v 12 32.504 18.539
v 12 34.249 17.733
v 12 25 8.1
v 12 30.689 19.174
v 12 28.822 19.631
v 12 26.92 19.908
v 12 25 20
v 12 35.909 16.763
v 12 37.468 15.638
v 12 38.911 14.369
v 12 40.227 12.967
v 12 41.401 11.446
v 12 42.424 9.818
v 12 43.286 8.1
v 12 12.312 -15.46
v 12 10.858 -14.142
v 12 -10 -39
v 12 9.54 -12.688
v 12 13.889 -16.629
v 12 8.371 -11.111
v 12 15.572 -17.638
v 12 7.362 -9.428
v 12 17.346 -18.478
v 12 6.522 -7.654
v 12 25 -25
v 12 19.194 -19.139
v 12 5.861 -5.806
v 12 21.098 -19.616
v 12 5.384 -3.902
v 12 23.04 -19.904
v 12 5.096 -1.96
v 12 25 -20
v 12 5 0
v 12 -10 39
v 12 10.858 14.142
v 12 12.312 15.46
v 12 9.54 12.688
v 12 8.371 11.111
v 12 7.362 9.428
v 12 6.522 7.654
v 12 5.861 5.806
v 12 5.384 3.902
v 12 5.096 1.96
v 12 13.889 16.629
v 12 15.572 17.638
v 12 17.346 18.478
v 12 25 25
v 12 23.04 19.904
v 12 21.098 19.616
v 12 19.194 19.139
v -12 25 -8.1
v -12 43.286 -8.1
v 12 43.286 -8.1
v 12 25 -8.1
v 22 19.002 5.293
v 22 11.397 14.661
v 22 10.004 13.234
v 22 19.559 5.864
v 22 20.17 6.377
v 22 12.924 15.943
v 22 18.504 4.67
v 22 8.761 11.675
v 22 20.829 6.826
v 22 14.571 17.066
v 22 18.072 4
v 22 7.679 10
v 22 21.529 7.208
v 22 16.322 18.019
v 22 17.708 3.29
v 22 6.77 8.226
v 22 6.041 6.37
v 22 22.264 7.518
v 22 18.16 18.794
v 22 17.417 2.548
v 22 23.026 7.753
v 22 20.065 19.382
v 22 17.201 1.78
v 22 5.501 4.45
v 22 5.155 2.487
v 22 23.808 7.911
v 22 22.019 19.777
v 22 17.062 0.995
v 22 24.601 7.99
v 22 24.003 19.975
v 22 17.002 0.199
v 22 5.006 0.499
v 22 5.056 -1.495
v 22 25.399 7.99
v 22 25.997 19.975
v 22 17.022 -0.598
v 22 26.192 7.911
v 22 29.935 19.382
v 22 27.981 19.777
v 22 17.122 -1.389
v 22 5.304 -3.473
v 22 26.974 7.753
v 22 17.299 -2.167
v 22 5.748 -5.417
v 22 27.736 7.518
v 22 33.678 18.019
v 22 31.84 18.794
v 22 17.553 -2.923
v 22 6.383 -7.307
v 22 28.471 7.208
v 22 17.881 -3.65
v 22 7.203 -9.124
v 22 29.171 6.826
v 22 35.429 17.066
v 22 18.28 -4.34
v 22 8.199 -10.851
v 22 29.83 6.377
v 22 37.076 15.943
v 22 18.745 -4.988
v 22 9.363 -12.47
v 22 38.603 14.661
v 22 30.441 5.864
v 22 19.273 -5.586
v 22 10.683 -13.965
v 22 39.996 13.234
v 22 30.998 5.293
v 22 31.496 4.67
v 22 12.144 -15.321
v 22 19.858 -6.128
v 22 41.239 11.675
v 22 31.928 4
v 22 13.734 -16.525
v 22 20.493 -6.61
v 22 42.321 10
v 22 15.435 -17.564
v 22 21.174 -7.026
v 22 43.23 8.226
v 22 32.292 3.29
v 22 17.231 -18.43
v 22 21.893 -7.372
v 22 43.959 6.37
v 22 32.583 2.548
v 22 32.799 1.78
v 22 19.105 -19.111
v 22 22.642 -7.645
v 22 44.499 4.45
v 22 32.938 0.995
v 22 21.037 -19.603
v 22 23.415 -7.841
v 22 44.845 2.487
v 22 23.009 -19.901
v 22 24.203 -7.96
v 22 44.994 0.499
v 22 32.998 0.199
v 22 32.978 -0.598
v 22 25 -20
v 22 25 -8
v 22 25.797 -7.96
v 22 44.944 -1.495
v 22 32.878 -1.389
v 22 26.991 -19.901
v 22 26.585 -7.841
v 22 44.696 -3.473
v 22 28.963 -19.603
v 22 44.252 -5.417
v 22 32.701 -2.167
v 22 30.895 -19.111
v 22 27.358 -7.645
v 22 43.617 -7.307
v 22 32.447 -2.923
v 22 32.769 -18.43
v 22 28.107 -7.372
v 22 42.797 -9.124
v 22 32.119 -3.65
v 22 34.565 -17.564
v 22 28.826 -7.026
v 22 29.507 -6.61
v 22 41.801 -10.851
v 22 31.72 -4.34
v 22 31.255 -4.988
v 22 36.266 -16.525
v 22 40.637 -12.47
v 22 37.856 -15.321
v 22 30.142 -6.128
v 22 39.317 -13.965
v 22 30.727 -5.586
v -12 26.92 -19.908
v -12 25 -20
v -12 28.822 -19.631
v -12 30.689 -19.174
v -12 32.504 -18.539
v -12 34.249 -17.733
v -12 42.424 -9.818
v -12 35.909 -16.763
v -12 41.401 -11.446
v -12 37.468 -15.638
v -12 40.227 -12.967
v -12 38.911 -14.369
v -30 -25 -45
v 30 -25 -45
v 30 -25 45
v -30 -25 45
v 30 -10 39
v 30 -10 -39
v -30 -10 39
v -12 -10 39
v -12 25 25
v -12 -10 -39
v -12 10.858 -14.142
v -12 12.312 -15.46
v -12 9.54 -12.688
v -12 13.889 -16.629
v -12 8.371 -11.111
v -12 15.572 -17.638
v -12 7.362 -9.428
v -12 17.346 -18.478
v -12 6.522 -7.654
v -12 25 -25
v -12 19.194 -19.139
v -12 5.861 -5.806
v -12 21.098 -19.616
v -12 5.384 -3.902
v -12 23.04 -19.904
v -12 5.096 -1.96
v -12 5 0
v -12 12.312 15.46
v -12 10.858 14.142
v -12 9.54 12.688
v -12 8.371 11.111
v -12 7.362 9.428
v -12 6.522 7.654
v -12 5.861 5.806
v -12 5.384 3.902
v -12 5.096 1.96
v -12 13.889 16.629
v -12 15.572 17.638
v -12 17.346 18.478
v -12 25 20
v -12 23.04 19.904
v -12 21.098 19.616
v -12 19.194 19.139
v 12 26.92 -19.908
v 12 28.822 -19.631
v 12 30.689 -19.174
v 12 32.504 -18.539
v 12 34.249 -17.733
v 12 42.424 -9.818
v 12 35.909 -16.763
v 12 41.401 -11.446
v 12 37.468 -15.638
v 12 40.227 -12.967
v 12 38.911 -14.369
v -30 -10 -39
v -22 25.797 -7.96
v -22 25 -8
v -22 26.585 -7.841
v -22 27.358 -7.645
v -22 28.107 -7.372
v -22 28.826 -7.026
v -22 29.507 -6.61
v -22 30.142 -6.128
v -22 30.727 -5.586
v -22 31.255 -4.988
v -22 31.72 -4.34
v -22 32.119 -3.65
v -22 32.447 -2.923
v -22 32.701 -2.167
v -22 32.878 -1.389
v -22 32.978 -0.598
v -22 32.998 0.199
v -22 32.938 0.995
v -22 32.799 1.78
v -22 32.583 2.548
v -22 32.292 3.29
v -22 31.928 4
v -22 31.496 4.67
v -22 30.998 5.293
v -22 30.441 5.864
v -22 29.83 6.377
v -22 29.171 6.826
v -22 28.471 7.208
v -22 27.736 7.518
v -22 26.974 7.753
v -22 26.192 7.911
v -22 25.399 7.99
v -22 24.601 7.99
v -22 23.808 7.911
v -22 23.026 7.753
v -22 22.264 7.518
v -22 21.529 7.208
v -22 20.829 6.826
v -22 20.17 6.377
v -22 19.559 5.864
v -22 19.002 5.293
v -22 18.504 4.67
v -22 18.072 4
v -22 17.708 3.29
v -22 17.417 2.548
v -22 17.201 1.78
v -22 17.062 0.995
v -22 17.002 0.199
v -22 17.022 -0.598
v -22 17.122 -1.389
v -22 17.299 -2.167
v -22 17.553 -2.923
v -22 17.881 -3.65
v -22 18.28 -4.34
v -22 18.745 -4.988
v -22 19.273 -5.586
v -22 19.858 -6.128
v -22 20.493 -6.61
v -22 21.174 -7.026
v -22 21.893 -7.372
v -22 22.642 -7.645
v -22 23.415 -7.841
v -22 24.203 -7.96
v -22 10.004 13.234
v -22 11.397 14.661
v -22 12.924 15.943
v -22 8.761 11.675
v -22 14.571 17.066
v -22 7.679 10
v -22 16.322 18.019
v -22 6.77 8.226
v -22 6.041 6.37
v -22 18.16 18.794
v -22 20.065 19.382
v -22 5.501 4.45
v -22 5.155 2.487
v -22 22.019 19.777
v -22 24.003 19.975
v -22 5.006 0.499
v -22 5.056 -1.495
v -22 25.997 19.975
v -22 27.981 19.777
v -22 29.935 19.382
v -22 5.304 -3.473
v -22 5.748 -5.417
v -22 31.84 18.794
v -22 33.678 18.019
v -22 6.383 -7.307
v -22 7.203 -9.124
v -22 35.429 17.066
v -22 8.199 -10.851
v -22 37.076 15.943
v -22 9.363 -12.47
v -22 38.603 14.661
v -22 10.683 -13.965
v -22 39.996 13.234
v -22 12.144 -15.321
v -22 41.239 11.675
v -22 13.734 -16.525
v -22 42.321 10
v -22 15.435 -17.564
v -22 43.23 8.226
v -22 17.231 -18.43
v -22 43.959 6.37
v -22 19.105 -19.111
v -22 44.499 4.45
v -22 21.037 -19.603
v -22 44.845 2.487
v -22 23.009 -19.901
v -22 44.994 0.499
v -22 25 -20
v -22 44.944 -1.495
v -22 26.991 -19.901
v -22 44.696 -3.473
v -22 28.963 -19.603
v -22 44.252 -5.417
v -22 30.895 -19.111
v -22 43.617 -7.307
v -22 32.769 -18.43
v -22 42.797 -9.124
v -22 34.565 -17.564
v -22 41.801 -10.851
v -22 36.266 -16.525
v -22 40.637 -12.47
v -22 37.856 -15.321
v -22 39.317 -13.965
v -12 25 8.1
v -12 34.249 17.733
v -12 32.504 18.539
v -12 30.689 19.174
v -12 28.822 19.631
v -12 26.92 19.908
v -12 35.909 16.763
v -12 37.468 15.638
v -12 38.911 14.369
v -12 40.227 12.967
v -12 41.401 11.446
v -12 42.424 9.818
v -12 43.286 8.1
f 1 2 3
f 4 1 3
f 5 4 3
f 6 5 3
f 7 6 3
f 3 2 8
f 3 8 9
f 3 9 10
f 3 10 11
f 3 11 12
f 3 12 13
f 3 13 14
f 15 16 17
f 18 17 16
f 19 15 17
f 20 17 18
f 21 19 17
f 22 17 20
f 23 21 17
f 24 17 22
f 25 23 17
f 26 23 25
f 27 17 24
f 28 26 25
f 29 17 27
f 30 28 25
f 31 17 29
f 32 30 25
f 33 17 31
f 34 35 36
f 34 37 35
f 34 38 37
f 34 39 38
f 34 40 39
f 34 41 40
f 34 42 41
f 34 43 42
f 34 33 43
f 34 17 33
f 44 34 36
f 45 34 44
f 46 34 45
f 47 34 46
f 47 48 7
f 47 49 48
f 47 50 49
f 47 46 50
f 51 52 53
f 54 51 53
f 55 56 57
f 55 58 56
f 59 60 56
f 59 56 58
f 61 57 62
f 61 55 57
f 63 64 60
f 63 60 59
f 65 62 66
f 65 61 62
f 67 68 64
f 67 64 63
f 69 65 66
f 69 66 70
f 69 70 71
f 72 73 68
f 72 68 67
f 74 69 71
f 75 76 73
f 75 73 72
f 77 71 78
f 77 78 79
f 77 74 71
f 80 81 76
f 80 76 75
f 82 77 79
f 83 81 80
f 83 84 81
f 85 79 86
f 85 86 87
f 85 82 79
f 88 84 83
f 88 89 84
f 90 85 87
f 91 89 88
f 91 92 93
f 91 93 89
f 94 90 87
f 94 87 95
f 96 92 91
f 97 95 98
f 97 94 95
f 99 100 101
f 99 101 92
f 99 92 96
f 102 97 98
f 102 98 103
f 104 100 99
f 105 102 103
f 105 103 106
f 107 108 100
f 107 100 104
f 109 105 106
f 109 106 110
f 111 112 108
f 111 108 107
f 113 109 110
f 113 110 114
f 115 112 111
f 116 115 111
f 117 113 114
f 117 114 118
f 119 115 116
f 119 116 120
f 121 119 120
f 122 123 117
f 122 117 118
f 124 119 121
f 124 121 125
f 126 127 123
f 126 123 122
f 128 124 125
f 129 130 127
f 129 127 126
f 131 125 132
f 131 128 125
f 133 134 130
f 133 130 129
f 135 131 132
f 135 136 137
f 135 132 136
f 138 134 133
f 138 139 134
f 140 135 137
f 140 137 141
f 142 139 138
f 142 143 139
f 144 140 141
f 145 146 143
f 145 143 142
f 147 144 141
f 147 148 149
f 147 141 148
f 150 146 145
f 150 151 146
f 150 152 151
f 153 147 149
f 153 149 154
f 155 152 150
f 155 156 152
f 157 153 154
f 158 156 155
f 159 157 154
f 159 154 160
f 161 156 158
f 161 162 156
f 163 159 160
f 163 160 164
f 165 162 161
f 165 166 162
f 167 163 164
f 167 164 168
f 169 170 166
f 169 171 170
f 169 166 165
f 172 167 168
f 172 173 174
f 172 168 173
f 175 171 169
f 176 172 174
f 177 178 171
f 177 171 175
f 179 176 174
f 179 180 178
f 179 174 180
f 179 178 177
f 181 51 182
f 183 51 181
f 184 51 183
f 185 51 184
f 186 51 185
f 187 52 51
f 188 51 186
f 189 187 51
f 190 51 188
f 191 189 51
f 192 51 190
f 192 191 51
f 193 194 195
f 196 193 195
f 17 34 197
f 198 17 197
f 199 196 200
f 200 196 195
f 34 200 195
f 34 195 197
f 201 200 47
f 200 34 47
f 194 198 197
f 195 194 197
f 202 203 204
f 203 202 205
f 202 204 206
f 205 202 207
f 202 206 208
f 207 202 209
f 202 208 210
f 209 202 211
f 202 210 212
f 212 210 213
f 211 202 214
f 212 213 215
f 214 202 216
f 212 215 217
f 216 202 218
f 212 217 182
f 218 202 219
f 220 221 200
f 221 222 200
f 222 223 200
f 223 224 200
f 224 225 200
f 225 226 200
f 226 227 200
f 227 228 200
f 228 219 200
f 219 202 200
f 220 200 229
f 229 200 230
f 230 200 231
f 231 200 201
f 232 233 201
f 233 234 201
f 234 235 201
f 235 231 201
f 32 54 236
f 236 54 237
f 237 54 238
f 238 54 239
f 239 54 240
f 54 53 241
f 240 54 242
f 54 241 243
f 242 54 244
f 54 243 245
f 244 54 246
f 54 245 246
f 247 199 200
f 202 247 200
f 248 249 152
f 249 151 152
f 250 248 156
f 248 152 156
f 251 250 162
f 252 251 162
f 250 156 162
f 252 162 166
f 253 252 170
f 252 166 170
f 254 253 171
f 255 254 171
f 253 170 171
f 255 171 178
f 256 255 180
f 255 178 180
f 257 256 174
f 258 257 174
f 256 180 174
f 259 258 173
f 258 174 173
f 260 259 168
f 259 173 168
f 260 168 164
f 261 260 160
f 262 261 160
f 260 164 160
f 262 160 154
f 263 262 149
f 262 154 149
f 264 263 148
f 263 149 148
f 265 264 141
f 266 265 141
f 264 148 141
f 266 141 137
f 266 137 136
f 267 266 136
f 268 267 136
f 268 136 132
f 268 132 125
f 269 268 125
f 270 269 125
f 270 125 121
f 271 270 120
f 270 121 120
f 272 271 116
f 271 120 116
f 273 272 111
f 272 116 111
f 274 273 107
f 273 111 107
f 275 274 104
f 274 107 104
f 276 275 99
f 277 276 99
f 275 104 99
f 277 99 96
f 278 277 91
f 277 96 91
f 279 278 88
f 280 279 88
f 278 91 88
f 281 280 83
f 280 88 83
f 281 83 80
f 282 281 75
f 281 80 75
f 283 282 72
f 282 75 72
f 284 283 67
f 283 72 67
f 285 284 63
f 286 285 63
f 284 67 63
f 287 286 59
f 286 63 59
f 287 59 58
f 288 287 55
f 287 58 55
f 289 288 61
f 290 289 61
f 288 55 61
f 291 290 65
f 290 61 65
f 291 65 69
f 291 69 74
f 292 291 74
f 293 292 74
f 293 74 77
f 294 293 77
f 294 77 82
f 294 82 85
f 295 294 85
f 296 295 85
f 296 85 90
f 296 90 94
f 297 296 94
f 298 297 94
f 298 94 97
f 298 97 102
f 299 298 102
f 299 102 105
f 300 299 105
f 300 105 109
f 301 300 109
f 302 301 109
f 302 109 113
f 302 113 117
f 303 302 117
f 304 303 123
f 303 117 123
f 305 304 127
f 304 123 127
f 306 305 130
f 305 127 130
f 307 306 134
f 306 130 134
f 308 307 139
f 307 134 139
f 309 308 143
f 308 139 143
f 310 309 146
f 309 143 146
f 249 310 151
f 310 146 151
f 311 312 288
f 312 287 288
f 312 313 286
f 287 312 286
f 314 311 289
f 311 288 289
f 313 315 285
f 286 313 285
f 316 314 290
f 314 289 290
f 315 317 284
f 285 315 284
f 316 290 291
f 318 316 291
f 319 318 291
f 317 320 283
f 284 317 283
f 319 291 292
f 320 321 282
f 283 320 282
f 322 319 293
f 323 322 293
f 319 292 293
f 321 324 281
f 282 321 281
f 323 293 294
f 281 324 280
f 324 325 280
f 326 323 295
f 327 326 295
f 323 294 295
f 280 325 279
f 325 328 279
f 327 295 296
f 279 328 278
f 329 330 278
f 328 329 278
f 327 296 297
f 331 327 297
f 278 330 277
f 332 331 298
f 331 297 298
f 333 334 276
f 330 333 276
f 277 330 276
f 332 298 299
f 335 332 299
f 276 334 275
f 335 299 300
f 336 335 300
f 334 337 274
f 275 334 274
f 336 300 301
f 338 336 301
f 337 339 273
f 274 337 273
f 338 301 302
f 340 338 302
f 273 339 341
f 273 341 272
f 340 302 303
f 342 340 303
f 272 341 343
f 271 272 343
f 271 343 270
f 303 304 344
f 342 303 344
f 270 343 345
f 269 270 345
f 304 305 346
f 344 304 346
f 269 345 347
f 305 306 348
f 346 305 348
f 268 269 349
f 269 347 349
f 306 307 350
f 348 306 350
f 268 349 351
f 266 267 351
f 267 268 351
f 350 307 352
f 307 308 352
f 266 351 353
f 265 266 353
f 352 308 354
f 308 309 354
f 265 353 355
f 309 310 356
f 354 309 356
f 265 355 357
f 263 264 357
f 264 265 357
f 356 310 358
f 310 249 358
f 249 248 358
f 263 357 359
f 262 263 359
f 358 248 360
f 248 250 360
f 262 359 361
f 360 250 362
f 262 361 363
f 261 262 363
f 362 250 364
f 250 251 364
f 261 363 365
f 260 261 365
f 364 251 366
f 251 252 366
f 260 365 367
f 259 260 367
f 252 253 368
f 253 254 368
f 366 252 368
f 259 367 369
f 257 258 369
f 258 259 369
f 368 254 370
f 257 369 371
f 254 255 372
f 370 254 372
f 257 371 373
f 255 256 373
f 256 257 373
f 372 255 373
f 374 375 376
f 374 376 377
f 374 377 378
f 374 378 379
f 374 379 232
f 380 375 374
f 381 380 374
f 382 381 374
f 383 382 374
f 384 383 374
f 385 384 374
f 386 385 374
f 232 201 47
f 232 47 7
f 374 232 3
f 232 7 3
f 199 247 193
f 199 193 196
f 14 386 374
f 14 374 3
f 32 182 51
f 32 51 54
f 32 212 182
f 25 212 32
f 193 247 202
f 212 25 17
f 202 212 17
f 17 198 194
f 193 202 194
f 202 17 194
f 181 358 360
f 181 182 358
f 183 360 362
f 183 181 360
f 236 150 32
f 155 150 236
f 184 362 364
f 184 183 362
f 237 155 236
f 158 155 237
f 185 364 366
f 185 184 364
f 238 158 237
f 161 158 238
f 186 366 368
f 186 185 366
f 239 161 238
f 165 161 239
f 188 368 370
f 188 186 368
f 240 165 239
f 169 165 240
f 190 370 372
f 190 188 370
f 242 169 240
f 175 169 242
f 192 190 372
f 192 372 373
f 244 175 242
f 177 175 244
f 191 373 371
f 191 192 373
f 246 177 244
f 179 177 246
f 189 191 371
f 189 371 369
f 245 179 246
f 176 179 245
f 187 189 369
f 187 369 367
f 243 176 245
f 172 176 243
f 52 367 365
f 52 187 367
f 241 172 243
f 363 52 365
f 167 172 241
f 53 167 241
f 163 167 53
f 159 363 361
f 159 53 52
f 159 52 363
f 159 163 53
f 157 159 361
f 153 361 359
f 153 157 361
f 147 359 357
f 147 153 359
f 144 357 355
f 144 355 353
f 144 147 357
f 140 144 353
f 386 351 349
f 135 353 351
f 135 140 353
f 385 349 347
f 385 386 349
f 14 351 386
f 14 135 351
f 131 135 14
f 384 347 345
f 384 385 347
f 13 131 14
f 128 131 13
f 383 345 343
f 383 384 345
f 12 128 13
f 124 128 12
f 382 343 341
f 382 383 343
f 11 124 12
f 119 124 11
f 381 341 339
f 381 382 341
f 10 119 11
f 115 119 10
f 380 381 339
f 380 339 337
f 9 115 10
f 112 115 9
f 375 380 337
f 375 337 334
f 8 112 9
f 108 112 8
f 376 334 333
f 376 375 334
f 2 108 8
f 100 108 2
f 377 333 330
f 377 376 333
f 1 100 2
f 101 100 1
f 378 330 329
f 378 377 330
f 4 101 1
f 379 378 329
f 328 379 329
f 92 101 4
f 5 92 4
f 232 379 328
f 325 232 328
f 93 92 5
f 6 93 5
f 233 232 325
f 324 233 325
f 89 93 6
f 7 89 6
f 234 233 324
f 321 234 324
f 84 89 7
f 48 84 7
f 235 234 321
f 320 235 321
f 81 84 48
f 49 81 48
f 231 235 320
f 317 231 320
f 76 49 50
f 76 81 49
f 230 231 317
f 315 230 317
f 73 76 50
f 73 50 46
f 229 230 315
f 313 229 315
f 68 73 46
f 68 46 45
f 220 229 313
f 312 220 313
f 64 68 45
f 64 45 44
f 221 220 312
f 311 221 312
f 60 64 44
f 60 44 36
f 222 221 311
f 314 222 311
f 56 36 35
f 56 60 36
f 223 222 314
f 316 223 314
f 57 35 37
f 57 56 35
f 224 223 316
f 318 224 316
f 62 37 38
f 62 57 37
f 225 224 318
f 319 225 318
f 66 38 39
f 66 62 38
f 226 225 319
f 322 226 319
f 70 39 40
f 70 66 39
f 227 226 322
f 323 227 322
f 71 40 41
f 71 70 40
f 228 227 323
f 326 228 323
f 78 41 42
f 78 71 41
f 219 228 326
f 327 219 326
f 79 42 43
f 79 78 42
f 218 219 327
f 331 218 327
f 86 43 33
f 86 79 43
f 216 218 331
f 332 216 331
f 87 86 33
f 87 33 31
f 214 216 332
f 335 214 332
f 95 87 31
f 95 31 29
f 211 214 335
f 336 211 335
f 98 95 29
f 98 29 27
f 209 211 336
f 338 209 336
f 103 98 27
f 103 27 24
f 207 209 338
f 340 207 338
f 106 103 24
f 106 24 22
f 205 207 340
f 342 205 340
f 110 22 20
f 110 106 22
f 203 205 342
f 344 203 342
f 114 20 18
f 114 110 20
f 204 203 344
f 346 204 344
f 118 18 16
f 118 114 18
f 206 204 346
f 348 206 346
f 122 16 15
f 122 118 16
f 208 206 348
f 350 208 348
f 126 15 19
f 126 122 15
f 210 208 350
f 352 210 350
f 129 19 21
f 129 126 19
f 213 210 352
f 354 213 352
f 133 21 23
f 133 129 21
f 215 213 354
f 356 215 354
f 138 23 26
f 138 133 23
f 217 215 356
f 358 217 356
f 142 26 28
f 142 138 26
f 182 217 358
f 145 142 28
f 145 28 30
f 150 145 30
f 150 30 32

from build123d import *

# Parameters (mm, degrees)
SALIENTE_EXTRUIR1_DEPTH = 30
CROQUIS2_W              = 18
CROQUIS2_H              = 35
CORTAR_EXTRUIR1_DEPTH   = 99.107084352
CROQUIS3_R              = 20
SALIENTE_EXTRUIR3_DEPTH = 22
CROQUIS3_4_R            = 8
CORTAR_EXTRUIR2_DEPTH   = 22
CROQUIS4_W              = 24
CROQUIS4_H              = 11.9
CORTAR_EXTRUIR6_DEPTH   = 20


with BuildPart() as part:
    # Croquis1 → Saliente-Extruir1 (new, symmetric)
    with BuildSketch(Plane(origin=(0, 0, 0), x_dir=(0, 0, -1), z_dir=(1, 0, 0))):
        Polygon((45, -25), (-45, -25), (-25, 25), (25, 25), align=None)
    extrude(amount=SALIENTE_EXTRUIR1_DEPTH, both=True)

    # Croquis2 → Cortar-Extruir1 (cut, through all)
    with BuildSketch(Plane.XY.offset(45)):
        with Locations((-21, 7.5)):
            Rectangle(CROQUIS2_W, CROQUIS2_H)
        with Locations((21, 7.5)):
            Rectangle(CROQUIS2_W, CROQUIS2_H)
    extrude(amount=-CORTAR_EXTRUIR1_DEPTH, mode=Mode.SUBTRACT)

    # Croquis3 → Saliente-Extruir3 (add, symmetric)
    with BuildSketch(Plane(origin=(0, 0, 0), x_dir=(0, 0, -1), z_dir=(1, 0, 0))):
        with Locations((0, 25)):
            Circle(CROQUIS3_R)
    extrude(amount=SALIENTE_EXTRUIR3_DEPTH, both=True)

    # Croquis3<4> → Cortar-Extruir2 (cut, symmetric)
    with BuildSketch(Plane(origin=(0, 0, 0), x_dir=(0, 0, -1), z_dir=(1, 0, 0))):
        with Locations((0, 25)):
            Circle(CROQUIS3_4_R)
    extrude(amount=CORTAR_EXTRUIR2_DEPTH, both=True, mode=Mode.SUBTRACT)

    # Croquis4 → Cortar-Extruir6 (cut)
    with BuildSketch(Plane(origin=(0, 45, 0), x_dir=(1, 0, 0), z_dir=(0, 1, 0))):
        with Locations((0, 14.05)):
            Rectangle(CROQUIS4_W, CROQUIS4_H)
        with Locations((0, -14.05)):
            Rectangle(CROQUIS4_W, CROQUIS4_H)
    extrude(amount=-CORTAR_EXTRUIR6_DEPTH, mode=Mode.SUBTRACT)


solid = part.part
